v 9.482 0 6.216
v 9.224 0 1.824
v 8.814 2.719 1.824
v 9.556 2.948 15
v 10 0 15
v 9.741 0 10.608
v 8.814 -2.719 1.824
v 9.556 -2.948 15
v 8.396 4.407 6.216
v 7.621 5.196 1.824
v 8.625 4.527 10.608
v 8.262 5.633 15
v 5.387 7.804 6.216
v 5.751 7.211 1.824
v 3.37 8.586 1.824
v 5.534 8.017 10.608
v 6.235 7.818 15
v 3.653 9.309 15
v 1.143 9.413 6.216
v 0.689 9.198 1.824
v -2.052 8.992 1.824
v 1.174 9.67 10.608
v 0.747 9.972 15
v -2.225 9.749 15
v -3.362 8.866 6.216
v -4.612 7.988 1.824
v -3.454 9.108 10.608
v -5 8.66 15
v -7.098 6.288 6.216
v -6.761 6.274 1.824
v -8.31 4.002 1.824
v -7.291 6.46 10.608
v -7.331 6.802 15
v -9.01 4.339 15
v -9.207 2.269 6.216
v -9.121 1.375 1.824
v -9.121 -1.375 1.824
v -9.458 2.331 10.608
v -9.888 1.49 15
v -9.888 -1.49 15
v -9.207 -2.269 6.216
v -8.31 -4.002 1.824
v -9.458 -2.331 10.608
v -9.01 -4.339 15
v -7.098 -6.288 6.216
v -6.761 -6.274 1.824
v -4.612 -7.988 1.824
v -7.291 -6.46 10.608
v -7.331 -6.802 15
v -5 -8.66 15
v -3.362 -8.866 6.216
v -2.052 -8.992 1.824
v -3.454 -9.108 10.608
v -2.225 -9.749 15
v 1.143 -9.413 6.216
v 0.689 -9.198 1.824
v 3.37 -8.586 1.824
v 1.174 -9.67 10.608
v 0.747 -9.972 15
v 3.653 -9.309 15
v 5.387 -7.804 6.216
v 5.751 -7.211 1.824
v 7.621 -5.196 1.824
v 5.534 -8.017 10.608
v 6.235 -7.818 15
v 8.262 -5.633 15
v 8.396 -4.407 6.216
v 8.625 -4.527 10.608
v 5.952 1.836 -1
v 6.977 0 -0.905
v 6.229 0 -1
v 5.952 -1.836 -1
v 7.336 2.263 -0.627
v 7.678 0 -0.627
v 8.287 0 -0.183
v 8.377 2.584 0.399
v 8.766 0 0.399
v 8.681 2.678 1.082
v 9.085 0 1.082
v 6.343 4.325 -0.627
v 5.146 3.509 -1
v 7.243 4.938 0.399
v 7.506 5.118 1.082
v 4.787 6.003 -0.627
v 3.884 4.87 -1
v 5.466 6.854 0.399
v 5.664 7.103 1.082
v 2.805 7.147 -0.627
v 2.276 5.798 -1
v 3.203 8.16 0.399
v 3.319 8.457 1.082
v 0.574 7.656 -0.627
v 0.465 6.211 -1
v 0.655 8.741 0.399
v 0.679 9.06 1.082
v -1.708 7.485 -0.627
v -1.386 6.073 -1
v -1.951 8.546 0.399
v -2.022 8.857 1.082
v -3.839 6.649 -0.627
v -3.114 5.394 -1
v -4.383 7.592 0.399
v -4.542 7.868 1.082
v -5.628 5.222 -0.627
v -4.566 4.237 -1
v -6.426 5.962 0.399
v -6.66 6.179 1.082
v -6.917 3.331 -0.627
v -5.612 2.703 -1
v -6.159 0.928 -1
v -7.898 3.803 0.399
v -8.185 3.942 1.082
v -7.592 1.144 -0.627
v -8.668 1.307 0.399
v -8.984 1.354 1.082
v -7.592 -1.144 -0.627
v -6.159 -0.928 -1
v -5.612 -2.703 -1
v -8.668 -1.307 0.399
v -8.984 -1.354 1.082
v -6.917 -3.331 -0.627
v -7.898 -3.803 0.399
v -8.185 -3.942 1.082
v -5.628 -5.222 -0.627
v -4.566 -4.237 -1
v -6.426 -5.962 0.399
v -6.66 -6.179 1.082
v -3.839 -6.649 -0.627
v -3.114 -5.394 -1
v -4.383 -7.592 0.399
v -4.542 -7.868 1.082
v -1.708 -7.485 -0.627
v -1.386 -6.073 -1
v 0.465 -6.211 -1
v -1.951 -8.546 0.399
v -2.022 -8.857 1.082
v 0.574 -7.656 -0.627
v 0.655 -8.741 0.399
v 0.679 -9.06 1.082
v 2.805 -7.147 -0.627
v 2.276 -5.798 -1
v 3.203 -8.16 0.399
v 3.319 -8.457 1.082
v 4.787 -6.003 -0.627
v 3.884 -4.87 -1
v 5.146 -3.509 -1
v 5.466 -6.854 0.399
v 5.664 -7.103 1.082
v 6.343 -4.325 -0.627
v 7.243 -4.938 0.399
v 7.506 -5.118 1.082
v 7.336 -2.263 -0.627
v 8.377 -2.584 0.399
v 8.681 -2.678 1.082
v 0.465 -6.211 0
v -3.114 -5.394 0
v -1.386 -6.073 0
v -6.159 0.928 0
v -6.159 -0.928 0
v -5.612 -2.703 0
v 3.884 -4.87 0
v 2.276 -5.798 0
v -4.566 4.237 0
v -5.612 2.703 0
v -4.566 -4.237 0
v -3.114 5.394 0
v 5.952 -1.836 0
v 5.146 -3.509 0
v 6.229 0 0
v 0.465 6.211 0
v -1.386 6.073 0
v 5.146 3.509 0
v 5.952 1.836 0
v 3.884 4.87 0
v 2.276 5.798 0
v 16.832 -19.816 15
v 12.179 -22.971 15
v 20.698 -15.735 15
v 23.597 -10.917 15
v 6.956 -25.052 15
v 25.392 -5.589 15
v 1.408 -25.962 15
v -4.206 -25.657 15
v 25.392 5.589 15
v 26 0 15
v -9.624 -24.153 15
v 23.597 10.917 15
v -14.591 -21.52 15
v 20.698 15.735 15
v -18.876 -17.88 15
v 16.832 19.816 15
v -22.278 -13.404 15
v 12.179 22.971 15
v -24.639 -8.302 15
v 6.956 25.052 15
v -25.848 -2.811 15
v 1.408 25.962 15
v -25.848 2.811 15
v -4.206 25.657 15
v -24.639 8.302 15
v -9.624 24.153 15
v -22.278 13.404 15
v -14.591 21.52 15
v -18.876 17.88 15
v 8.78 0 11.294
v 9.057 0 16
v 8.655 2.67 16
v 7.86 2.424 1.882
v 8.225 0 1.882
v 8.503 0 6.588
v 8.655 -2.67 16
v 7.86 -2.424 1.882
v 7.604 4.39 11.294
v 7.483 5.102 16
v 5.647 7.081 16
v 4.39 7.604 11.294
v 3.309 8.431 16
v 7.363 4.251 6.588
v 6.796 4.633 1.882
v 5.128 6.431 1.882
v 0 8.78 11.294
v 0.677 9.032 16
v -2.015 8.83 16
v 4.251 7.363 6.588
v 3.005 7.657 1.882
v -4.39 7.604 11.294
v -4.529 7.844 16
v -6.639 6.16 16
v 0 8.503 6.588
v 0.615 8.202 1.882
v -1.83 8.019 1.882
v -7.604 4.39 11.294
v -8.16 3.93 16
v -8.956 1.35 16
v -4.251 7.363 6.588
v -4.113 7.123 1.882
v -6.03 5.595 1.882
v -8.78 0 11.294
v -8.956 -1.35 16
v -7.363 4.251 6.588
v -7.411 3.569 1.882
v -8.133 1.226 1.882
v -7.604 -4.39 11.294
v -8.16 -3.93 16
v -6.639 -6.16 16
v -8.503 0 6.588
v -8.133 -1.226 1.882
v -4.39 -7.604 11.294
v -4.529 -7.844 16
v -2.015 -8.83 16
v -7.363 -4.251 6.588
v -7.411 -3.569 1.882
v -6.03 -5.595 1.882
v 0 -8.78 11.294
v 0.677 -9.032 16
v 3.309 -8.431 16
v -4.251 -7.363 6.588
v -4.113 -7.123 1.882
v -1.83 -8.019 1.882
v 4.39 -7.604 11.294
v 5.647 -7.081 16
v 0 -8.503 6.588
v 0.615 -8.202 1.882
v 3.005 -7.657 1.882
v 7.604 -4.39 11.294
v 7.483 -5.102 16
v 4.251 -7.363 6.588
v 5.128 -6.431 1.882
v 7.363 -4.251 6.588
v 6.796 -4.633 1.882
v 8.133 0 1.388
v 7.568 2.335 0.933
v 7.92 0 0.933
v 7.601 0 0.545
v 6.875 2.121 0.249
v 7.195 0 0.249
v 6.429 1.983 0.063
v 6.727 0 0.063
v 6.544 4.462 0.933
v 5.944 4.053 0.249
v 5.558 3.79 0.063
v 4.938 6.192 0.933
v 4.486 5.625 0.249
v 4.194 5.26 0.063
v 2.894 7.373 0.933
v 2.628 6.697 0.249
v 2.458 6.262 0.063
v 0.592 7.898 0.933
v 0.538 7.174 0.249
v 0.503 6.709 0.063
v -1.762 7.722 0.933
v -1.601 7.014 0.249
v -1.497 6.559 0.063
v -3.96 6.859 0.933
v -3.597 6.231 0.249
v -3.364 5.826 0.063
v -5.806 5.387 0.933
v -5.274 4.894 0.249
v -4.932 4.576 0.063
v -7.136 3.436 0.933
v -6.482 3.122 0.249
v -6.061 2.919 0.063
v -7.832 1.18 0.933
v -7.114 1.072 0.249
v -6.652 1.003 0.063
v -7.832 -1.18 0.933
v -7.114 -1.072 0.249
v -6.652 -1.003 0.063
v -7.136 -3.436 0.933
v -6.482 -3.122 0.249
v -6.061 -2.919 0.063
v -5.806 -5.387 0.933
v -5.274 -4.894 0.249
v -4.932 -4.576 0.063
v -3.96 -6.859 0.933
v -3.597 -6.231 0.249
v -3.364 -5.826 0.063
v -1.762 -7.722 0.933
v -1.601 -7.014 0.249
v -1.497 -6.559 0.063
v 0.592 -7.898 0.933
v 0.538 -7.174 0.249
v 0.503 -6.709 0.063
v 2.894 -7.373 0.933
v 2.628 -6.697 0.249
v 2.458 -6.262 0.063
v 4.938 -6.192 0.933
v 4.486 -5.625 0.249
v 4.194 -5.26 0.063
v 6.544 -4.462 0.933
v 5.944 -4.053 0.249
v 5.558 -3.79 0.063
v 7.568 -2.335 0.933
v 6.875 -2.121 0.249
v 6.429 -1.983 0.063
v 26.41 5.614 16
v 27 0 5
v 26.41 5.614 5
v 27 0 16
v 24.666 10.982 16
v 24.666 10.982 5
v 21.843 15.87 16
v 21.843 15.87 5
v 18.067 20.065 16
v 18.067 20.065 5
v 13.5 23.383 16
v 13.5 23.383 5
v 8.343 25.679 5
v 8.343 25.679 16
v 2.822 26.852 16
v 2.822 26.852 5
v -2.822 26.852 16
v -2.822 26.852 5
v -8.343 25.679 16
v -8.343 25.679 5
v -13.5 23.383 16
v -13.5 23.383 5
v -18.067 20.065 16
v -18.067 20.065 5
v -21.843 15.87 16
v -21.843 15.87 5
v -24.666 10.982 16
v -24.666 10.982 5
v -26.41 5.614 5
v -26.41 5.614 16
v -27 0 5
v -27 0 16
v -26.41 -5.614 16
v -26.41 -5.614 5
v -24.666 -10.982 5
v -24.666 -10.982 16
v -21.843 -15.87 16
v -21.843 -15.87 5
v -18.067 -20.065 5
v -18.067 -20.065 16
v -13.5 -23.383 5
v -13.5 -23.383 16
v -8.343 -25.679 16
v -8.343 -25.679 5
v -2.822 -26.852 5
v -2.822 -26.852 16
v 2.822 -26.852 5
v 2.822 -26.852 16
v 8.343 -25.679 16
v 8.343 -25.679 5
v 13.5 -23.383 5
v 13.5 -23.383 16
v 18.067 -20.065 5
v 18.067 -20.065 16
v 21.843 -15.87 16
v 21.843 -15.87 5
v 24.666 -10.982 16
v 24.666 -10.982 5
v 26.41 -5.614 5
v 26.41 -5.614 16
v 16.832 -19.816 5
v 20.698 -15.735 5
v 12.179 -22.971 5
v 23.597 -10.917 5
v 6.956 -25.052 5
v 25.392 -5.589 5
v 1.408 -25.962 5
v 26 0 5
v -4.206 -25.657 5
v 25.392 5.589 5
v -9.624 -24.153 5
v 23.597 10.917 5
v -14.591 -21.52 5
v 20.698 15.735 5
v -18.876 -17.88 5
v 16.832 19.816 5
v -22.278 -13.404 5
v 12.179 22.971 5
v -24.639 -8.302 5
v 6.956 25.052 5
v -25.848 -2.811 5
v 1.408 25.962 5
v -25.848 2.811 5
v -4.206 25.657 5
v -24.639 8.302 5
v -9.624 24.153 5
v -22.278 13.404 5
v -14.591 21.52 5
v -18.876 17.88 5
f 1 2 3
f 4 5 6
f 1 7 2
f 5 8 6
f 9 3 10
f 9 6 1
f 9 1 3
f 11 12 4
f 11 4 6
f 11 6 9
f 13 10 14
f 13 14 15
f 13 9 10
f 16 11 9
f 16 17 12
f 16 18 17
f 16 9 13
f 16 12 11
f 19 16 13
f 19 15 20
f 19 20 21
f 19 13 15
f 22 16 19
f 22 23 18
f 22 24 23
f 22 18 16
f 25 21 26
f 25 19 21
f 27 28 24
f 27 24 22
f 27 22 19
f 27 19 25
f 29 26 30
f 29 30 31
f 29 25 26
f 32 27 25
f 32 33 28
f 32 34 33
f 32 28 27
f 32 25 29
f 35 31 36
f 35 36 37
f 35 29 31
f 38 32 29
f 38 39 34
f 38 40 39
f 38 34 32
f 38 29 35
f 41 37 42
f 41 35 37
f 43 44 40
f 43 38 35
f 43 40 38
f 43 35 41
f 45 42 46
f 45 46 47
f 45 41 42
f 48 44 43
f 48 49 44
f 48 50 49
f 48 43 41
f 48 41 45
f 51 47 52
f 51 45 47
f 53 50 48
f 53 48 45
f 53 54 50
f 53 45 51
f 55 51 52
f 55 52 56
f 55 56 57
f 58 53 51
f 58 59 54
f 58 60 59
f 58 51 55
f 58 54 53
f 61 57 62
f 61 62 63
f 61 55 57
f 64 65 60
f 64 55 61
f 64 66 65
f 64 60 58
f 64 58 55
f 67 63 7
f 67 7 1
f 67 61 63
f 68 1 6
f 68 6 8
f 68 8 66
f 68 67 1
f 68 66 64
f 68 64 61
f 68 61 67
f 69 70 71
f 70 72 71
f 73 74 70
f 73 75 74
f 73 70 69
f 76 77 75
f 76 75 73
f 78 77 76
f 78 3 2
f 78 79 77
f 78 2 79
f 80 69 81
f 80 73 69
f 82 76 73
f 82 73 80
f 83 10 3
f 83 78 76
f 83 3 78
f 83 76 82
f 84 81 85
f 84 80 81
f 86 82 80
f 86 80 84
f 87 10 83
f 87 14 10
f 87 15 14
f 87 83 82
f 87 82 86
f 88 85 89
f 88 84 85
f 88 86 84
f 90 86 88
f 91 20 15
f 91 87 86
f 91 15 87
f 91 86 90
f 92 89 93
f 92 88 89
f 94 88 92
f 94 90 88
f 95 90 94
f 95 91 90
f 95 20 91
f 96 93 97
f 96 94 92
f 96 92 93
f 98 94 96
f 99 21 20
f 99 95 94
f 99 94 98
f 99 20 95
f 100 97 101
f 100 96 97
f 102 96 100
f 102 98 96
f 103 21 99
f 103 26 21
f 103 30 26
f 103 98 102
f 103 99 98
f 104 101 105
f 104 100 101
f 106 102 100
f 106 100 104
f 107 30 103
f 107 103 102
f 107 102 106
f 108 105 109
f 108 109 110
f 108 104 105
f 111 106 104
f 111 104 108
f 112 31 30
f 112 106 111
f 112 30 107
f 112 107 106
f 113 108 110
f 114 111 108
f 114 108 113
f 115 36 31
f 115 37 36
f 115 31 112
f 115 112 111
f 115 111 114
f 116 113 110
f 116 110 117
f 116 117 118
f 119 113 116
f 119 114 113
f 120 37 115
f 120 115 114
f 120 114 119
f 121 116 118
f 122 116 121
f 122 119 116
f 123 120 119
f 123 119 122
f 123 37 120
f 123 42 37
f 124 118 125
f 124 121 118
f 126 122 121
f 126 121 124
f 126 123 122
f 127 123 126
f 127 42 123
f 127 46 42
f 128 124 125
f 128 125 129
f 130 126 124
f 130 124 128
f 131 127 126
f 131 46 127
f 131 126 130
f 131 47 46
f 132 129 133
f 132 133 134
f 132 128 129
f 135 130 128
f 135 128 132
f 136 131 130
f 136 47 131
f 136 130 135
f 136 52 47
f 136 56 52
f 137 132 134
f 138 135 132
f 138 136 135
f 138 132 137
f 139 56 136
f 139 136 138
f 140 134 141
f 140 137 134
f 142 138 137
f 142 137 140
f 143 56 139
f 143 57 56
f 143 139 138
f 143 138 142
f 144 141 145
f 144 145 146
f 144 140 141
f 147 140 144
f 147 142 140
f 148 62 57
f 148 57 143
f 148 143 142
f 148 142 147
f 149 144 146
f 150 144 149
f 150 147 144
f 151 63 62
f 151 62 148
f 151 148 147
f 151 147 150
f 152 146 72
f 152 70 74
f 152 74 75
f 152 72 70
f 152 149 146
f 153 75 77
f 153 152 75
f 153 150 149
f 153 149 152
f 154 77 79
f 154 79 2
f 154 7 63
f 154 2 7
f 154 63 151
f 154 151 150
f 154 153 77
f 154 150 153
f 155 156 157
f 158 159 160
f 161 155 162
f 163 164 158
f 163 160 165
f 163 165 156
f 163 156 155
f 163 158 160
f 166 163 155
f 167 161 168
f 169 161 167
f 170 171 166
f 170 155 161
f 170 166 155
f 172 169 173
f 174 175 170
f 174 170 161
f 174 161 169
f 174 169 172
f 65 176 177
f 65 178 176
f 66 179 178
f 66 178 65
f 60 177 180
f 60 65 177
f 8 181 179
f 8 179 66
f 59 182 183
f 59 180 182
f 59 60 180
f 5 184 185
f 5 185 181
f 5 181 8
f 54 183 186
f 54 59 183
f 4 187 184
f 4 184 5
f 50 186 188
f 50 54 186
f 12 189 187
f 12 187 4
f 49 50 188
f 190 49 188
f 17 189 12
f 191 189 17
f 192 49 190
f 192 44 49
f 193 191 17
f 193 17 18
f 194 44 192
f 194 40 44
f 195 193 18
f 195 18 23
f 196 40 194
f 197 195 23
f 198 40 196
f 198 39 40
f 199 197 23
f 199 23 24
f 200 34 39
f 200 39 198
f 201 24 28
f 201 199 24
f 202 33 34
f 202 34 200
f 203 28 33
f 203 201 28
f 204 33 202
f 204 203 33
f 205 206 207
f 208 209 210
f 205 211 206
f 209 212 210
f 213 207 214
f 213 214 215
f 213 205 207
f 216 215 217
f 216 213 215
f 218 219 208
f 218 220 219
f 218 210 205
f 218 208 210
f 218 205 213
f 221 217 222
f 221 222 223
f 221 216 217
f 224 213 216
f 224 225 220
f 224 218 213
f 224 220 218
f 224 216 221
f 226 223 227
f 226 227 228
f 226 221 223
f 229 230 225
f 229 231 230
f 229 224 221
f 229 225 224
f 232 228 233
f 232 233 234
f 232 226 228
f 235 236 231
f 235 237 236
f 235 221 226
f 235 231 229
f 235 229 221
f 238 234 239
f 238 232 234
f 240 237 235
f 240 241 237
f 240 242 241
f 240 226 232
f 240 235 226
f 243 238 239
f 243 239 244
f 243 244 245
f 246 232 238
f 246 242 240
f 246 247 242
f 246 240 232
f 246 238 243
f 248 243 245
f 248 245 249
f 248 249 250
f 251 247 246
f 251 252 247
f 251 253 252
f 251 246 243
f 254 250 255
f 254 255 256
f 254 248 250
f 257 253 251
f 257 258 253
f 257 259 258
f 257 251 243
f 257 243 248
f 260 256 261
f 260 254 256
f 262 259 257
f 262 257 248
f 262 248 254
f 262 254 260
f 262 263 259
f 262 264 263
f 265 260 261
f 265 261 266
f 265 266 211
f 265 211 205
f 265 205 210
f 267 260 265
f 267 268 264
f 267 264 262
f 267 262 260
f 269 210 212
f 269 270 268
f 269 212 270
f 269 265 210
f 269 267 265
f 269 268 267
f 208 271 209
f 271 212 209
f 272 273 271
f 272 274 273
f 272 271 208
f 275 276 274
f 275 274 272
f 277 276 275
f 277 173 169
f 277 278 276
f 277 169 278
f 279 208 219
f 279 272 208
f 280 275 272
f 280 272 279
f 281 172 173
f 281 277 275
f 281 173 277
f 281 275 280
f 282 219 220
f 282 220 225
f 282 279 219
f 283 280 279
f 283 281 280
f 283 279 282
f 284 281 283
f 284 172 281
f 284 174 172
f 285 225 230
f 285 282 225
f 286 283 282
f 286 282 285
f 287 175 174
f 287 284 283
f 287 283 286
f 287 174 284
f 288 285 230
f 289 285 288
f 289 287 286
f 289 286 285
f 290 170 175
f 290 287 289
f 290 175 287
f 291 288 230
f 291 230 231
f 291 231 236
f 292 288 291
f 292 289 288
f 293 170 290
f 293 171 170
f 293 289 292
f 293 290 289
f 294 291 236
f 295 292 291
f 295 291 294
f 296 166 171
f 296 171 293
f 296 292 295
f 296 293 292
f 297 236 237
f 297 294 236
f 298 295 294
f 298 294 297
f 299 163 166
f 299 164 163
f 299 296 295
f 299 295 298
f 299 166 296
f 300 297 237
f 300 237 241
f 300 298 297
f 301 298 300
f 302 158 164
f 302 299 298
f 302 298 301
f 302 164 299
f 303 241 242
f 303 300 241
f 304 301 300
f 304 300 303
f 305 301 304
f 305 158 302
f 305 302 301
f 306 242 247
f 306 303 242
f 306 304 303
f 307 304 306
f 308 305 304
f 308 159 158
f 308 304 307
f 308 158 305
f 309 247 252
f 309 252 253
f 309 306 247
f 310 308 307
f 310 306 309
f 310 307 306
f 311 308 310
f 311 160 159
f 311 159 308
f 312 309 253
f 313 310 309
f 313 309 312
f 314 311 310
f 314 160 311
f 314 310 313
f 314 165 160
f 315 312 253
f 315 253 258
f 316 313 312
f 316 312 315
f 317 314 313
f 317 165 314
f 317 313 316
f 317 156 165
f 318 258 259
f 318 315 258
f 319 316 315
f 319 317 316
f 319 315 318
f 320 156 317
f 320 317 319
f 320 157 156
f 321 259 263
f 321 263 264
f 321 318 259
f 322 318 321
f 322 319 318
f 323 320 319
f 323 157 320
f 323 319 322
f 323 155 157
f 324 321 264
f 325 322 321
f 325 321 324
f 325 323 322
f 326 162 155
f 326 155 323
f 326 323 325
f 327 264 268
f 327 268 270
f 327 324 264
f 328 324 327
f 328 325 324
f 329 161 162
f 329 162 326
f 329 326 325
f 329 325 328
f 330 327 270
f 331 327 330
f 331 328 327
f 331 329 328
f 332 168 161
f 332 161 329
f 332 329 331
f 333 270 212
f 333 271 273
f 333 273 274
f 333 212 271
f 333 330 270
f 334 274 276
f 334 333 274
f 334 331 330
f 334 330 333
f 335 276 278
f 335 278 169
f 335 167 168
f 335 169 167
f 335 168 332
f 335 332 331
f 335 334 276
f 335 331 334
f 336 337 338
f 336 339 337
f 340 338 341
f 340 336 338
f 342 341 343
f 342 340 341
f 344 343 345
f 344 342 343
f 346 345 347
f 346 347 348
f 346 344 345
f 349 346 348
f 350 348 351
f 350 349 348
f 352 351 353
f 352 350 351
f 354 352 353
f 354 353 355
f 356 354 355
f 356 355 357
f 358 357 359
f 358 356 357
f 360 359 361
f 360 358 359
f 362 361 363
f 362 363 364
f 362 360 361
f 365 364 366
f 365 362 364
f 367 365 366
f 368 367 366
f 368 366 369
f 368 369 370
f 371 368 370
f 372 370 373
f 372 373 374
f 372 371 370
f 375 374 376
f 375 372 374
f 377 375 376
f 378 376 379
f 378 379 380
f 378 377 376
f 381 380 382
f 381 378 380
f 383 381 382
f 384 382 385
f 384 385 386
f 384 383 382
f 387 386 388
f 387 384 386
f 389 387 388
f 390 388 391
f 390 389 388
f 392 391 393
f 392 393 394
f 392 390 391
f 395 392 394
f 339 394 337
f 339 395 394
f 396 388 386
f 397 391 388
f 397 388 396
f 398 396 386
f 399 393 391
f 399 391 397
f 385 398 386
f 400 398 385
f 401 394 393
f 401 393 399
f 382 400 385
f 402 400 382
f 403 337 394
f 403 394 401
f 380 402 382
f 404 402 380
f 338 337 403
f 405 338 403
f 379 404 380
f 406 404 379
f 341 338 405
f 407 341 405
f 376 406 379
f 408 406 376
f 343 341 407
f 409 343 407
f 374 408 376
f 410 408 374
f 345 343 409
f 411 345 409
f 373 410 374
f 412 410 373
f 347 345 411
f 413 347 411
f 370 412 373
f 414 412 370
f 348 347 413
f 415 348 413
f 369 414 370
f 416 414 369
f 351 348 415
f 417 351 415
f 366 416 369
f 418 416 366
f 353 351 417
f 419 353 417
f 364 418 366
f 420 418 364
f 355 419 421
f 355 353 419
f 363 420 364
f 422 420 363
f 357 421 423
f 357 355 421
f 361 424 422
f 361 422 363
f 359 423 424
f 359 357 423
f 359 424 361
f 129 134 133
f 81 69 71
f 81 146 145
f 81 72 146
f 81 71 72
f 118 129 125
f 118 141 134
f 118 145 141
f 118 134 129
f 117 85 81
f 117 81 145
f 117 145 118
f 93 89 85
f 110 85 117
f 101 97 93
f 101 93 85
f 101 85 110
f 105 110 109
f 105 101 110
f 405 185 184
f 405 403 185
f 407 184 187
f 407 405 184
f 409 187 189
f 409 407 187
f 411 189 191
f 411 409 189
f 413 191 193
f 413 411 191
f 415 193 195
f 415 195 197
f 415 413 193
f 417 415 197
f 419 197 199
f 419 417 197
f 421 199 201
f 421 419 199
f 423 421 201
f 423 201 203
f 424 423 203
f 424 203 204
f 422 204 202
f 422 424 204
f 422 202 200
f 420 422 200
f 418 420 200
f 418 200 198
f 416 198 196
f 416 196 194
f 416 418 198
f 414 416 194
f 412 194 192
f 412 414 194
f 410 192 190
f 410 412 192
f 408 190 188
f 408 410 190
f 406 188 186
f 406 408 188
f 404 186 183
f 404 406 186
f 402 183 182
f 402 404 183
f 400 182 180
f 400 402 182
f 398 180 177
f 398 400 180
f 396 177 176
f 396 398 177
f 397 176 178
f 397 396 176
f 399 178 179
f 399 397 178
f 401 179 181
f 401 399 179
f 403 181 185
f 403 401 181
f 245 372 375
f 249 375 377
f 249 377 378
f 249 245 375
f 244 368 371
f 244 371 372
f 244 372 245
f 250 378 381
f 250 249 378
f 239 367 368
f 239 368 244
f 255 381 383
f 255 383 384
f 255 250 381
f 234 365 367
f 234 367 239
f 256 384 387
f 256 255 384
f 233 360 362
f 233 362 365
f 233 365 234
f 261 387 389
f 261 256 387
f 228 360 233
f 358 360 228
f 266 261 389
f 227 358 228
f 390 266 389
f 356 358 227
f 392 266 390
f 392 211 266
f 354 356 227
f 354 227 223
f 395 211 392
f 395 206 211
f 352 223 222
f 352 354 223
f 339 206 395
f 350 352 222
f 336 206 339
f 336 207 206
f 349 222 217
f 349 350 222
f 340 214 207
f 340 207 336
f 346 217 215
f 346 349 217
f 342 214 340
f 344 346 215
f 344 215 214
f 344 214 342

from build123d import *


with BuildPart() as f1:
    # F0 (on Front) → F1 (revolve)
    with BuildSketch(Plane.XZ):
        with BuildLine():
            Line((6.228764, 0), (0, 0))
            Line((0, 0), (0, -1))
            Line((0, -1), (6.228764, -1))
            ThreePointArc((6.228764, -1), (8.286747, -0.182821), (9.223569, 1.823529))
            Line((9.223569, 1.823529), (10, 15))
            Line((10, 15), (26, 15))
            Line((26, 15), (26, 5))
            Line((26, 5), (27, 5))
            Line((27, 5), (27, 16))
            Line((27, 16), (9.057191, 16))
            Line((9.057191, 16), (8.225301, 1.882353))
            ThreePointArc((8.225301, 1.882353), (7.600753, 0.544786), (6.228764, 0))
        make_face()
    revolve(axis=Axis((0, 0, -0.5), (0, 0, 1)))


solid = f1.part
